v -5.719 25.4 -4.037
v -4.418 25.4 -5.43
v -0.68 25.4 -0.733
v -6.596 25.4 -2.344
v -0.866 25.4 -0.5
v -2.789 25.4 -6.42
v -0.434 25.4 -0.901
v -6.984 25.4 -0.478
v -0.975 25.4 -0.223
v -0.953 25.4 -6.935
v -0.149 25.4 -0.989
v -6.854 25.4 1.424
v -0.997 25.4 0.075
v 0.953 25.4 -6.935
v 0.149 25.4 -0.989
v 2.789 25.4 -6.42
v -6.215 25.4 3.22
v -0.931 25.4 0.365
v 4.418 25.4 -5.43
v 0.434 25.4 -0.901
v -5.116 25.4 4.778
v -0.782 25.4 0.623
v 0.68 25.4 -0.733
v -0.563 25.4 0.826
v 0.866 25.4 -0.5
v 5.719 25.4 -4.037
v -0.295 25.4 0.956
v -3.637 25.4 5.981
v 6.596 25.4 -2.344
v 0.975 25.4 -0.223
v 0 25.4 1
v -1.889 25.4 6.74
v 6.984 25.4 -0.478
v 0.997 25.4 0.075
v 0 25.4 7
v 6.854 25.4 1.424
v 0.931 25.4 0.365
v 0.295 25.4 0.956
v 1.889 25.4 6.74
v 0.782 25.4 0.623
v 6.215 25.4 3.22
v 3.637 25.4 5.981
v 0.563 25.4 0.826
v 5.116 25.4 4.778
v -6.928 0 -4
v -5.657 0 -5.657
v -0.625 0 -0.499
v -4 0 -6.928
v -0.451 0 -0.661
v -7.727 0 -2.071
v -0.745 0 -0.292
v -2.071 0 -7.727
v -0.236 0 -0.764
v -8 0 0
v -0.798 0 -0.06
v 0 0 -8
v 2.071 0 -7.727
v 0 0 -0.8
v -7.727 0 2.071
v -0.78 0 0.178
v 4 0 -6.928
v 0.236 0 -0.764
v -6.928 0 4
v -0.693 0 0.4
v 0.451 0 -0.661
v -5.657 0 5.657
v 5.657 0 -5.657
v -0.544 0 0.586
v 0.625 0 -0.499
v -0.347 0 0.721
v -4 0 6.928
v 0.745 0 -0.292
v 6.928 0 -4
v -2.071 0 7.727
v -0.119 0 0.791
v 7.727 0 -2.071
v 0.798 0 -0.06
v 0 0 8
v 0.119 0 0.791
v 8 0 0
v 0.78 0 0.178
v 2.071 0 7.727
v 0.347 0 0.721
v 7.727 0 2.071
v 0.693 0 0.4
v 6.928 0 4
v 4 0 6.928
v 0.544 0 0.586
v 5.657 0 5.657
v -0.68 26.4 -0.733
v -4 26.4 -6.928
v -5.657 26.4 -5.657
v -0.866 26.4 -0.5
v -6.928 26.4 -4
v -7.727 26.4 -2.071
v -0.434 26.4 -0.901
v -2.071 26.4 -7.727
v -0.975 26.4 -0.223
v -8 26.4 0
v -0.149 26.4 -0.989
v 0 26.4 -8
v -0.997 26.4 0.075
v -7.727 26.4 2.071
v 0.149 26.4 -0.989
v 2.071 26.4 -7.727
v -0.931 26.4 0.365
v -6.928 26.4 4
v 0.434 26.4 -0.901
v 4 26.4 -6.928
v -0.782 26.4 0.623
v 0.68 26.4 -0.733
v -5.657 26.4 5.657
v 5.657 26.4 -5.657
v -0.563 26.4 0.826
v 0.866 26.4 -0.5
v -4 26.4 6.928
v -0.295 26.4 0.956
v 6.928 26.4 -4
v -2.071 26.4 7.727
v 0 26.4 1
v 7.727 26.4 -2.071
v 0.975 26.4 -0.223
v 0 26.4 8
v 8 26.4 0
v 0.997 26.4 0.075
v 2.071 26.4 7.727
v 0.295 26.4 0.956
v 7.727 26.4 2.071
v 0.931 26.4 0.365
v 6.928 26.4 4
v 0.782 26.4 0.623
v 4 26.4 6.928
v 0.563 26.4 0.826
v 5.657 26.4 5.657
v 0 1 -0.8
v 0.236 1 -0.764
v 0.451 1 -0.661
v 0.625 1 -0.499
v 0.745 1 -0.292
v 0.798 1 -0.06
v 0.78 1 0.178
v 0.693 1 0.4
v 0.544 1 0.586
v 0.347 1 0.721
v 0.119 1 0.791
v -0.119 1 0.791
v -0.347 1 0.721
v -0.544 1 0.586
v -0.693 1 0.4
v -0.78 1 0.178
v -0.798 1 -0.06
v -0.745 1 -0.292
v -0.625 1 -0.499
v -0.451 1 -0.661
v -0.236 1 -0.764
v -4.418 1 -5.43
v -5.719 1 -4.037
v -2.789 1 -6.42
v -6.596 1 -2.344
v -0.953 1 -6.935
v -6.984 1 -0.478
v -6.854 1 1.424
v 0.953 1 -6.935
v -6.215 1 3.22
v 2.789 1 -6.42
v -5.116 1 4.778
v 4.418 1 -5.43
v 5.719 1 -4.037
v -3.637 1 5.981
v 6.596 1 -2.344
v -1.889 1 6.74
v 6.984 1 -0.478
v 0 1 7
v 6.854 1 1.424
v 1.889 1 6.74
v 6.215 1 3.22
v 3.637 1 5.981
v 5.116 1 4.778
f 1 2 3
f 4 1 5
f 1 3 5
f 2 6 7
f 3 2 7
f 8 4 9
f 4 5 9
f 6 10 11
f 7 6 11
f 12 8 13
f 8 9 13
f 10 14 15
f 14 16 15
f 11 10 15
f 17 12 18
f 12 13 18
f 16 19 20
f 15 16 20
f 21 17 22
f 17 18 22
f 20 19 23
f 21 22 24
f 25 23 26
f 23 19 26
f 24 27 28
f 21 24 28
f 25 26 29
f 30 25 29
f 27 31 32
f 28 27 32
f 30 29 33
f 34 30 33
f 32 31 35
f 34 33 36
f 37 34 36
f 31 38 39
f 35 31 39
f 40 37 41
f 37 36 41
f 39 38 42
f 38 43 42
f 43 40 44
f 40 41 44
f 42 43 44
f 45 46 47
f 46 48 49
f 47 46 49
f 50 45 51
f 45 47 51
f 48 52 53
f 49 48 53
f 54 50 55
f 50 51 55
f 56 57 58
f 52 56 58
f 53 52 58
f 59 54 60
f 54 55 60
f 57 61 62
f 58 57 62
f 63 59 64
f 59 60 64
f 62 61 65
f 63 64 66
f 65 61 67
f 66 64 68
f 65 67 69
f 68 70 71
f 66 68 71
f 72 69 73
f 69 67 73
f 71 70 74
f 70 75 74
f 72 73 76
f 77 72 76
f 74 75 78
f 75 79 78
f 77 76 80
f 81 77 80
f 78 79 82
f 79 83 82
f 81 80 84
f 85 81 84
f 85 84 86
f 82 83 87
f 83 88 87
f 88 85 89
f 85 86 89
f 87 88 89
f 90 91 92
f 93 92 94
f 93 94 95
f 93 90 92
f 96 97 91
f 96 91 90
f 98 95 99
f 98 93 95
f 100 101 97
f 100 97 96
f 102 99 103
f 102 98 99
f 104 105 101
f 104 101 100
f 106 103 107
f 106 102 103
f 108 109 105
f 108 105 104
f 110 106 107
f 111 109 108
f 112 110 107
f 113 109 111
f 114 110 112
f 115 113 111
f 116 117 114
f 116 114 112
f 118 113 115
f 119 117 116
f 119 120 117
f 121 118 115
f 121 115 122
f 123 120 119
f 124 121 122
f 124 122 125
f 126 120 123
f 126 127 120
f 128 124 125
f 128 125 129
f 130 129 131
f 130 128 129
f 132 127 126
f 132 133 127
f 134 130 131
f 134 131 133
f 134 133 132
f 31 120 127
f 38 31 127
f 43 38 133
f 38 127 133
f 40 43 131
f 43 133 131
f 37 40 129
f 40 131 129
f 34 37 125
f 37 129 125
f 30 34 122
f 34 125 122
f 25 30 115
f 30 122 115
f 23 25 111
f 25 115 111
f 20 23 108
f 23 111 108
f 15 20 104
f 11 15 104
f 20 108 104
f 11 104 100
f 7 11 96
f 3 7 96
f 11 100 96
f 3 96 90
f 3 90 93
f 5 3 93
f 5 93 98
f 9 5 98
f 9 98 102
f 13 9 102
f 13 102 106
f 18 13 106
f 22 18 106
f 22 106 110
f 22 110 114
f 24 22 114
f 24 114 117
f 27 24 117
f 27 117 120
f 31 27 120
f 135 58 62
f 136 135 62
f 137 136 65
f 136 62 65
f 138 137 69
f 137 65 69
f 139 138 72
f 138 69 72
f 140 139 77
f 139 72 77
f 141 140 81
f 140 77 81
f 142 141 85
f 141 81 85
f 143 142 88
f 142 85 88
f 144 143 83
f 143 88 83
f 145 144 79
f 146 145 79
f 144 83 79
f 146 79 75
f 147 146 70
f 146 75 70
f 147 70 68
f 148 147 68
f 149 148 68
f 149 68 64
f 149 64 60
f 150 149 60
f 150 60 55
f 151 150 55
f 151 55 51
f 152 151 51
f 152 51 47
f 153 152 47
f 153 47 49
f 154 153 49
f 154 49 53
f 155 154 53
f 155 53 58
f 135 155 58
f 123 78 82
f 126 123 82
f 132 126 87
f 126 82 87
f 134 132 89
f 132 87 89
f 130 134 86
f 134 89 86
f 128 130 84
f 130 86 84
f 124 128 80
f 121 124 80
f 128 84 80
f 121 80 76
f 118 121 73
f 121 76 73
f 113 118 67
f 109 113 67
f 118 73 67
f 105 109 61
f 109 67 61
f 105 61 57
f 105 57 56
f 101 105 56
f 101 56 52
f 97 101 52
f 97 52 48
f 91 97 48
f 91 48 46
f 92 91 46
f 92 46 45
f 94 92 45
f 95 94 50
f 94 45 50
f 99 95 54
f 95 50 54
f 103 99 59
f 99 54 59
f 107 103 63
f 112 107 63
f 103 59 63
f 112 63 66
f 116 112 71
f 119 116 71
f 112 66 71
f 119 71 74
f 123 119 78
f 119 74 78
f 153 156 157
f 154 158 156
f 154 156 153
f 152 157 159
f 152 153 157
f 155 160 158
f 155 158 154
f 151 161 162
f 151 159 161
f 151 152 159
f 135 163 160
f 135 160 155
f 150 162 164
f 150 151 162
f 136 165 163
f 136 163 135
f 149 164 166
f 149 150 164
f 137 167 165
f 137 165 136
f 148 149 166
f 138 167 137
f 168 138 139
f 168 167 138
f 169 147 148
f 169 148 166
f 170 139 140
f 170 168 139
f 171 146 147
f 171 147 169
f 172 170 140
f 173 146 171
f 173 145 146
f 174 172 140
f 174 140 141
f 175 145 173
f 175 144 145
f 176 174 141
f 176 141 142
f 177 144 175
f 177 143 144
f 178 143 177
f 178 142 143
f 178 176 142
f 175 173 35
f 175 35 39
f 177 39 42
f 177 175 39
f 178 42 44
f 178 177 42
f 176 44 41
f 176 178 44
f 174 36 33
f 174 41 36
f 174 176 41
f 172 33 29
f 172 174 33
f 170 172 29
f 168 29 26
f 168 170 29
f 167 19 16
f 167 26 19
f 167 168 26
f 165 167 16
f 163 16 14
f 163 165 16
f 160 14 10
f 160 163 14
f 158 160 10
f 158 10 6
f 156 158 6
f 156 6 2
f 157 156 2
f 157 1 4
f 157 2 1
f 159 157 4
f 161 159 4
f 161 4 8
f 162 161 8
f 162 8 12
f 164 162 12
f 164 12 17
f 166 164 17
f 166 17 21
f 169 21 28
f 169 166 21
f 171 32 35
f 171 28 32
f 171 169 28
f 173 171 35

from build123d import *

# Parameters (mm, degrees)
SKETCH1_R           = 8
BOSS_EXTRUDE1_DEPTH = 26.4
SHELL7_T            = 1
SKETCH4_R           = 1
CUT_EXTRUDE1_DEPTH  = 3
SKETCH6_R           = 0.8
CUT_EXTRUDE2_DEPTH  = 6


with BuildPart() as part:
    # Sketch1 → Boss-Extrude1 (new body)
    with BuildSketch(Plane(origin=(0, 0, 0), x_dir=(1, 0, 0), z_dir=(0, 1, 0))):
        with Locations(Location((0, 0, 0), (0, 0, 270))):
            Circle(SKETCH1_R)
    extrude(amount=BOSS_EXTRUDE1_DEPTH)

    # Shell7 (no face opened: a closed hollow body)
    add(offset(amount=-SHELL7_T, mode=Mode.PRIVATE), mode=Mode.SUBTRACT)

    # Sketch4 → Cut-Extrude1 (cut)
    with BuildSketch(Plane(origin=(0, 26.4, 0), x_dir=(1, 0, 0), z_dir=(0, 1, 0))):
        with Locations(Location((0, 0, 0), (0, 0, 270))):
            Circle(SKETCH4_R)
    extrude(amount=-CUT_EXTRUDE1_DEPTH, mode=Mode.SUBTRACT)

    # Sketch6 → Cut-Extrude2 (cut)
    with BuildSketch(Plane.XZ):
        with Locations(Location((0, 0, 0), (0, 0, 270))):
            Circle(SKETCH6_R)
    extrude(amount=-CUT_EXTRUDE2_DEPTH, mode=Mode.SUBTRACT)


solid = part.part
